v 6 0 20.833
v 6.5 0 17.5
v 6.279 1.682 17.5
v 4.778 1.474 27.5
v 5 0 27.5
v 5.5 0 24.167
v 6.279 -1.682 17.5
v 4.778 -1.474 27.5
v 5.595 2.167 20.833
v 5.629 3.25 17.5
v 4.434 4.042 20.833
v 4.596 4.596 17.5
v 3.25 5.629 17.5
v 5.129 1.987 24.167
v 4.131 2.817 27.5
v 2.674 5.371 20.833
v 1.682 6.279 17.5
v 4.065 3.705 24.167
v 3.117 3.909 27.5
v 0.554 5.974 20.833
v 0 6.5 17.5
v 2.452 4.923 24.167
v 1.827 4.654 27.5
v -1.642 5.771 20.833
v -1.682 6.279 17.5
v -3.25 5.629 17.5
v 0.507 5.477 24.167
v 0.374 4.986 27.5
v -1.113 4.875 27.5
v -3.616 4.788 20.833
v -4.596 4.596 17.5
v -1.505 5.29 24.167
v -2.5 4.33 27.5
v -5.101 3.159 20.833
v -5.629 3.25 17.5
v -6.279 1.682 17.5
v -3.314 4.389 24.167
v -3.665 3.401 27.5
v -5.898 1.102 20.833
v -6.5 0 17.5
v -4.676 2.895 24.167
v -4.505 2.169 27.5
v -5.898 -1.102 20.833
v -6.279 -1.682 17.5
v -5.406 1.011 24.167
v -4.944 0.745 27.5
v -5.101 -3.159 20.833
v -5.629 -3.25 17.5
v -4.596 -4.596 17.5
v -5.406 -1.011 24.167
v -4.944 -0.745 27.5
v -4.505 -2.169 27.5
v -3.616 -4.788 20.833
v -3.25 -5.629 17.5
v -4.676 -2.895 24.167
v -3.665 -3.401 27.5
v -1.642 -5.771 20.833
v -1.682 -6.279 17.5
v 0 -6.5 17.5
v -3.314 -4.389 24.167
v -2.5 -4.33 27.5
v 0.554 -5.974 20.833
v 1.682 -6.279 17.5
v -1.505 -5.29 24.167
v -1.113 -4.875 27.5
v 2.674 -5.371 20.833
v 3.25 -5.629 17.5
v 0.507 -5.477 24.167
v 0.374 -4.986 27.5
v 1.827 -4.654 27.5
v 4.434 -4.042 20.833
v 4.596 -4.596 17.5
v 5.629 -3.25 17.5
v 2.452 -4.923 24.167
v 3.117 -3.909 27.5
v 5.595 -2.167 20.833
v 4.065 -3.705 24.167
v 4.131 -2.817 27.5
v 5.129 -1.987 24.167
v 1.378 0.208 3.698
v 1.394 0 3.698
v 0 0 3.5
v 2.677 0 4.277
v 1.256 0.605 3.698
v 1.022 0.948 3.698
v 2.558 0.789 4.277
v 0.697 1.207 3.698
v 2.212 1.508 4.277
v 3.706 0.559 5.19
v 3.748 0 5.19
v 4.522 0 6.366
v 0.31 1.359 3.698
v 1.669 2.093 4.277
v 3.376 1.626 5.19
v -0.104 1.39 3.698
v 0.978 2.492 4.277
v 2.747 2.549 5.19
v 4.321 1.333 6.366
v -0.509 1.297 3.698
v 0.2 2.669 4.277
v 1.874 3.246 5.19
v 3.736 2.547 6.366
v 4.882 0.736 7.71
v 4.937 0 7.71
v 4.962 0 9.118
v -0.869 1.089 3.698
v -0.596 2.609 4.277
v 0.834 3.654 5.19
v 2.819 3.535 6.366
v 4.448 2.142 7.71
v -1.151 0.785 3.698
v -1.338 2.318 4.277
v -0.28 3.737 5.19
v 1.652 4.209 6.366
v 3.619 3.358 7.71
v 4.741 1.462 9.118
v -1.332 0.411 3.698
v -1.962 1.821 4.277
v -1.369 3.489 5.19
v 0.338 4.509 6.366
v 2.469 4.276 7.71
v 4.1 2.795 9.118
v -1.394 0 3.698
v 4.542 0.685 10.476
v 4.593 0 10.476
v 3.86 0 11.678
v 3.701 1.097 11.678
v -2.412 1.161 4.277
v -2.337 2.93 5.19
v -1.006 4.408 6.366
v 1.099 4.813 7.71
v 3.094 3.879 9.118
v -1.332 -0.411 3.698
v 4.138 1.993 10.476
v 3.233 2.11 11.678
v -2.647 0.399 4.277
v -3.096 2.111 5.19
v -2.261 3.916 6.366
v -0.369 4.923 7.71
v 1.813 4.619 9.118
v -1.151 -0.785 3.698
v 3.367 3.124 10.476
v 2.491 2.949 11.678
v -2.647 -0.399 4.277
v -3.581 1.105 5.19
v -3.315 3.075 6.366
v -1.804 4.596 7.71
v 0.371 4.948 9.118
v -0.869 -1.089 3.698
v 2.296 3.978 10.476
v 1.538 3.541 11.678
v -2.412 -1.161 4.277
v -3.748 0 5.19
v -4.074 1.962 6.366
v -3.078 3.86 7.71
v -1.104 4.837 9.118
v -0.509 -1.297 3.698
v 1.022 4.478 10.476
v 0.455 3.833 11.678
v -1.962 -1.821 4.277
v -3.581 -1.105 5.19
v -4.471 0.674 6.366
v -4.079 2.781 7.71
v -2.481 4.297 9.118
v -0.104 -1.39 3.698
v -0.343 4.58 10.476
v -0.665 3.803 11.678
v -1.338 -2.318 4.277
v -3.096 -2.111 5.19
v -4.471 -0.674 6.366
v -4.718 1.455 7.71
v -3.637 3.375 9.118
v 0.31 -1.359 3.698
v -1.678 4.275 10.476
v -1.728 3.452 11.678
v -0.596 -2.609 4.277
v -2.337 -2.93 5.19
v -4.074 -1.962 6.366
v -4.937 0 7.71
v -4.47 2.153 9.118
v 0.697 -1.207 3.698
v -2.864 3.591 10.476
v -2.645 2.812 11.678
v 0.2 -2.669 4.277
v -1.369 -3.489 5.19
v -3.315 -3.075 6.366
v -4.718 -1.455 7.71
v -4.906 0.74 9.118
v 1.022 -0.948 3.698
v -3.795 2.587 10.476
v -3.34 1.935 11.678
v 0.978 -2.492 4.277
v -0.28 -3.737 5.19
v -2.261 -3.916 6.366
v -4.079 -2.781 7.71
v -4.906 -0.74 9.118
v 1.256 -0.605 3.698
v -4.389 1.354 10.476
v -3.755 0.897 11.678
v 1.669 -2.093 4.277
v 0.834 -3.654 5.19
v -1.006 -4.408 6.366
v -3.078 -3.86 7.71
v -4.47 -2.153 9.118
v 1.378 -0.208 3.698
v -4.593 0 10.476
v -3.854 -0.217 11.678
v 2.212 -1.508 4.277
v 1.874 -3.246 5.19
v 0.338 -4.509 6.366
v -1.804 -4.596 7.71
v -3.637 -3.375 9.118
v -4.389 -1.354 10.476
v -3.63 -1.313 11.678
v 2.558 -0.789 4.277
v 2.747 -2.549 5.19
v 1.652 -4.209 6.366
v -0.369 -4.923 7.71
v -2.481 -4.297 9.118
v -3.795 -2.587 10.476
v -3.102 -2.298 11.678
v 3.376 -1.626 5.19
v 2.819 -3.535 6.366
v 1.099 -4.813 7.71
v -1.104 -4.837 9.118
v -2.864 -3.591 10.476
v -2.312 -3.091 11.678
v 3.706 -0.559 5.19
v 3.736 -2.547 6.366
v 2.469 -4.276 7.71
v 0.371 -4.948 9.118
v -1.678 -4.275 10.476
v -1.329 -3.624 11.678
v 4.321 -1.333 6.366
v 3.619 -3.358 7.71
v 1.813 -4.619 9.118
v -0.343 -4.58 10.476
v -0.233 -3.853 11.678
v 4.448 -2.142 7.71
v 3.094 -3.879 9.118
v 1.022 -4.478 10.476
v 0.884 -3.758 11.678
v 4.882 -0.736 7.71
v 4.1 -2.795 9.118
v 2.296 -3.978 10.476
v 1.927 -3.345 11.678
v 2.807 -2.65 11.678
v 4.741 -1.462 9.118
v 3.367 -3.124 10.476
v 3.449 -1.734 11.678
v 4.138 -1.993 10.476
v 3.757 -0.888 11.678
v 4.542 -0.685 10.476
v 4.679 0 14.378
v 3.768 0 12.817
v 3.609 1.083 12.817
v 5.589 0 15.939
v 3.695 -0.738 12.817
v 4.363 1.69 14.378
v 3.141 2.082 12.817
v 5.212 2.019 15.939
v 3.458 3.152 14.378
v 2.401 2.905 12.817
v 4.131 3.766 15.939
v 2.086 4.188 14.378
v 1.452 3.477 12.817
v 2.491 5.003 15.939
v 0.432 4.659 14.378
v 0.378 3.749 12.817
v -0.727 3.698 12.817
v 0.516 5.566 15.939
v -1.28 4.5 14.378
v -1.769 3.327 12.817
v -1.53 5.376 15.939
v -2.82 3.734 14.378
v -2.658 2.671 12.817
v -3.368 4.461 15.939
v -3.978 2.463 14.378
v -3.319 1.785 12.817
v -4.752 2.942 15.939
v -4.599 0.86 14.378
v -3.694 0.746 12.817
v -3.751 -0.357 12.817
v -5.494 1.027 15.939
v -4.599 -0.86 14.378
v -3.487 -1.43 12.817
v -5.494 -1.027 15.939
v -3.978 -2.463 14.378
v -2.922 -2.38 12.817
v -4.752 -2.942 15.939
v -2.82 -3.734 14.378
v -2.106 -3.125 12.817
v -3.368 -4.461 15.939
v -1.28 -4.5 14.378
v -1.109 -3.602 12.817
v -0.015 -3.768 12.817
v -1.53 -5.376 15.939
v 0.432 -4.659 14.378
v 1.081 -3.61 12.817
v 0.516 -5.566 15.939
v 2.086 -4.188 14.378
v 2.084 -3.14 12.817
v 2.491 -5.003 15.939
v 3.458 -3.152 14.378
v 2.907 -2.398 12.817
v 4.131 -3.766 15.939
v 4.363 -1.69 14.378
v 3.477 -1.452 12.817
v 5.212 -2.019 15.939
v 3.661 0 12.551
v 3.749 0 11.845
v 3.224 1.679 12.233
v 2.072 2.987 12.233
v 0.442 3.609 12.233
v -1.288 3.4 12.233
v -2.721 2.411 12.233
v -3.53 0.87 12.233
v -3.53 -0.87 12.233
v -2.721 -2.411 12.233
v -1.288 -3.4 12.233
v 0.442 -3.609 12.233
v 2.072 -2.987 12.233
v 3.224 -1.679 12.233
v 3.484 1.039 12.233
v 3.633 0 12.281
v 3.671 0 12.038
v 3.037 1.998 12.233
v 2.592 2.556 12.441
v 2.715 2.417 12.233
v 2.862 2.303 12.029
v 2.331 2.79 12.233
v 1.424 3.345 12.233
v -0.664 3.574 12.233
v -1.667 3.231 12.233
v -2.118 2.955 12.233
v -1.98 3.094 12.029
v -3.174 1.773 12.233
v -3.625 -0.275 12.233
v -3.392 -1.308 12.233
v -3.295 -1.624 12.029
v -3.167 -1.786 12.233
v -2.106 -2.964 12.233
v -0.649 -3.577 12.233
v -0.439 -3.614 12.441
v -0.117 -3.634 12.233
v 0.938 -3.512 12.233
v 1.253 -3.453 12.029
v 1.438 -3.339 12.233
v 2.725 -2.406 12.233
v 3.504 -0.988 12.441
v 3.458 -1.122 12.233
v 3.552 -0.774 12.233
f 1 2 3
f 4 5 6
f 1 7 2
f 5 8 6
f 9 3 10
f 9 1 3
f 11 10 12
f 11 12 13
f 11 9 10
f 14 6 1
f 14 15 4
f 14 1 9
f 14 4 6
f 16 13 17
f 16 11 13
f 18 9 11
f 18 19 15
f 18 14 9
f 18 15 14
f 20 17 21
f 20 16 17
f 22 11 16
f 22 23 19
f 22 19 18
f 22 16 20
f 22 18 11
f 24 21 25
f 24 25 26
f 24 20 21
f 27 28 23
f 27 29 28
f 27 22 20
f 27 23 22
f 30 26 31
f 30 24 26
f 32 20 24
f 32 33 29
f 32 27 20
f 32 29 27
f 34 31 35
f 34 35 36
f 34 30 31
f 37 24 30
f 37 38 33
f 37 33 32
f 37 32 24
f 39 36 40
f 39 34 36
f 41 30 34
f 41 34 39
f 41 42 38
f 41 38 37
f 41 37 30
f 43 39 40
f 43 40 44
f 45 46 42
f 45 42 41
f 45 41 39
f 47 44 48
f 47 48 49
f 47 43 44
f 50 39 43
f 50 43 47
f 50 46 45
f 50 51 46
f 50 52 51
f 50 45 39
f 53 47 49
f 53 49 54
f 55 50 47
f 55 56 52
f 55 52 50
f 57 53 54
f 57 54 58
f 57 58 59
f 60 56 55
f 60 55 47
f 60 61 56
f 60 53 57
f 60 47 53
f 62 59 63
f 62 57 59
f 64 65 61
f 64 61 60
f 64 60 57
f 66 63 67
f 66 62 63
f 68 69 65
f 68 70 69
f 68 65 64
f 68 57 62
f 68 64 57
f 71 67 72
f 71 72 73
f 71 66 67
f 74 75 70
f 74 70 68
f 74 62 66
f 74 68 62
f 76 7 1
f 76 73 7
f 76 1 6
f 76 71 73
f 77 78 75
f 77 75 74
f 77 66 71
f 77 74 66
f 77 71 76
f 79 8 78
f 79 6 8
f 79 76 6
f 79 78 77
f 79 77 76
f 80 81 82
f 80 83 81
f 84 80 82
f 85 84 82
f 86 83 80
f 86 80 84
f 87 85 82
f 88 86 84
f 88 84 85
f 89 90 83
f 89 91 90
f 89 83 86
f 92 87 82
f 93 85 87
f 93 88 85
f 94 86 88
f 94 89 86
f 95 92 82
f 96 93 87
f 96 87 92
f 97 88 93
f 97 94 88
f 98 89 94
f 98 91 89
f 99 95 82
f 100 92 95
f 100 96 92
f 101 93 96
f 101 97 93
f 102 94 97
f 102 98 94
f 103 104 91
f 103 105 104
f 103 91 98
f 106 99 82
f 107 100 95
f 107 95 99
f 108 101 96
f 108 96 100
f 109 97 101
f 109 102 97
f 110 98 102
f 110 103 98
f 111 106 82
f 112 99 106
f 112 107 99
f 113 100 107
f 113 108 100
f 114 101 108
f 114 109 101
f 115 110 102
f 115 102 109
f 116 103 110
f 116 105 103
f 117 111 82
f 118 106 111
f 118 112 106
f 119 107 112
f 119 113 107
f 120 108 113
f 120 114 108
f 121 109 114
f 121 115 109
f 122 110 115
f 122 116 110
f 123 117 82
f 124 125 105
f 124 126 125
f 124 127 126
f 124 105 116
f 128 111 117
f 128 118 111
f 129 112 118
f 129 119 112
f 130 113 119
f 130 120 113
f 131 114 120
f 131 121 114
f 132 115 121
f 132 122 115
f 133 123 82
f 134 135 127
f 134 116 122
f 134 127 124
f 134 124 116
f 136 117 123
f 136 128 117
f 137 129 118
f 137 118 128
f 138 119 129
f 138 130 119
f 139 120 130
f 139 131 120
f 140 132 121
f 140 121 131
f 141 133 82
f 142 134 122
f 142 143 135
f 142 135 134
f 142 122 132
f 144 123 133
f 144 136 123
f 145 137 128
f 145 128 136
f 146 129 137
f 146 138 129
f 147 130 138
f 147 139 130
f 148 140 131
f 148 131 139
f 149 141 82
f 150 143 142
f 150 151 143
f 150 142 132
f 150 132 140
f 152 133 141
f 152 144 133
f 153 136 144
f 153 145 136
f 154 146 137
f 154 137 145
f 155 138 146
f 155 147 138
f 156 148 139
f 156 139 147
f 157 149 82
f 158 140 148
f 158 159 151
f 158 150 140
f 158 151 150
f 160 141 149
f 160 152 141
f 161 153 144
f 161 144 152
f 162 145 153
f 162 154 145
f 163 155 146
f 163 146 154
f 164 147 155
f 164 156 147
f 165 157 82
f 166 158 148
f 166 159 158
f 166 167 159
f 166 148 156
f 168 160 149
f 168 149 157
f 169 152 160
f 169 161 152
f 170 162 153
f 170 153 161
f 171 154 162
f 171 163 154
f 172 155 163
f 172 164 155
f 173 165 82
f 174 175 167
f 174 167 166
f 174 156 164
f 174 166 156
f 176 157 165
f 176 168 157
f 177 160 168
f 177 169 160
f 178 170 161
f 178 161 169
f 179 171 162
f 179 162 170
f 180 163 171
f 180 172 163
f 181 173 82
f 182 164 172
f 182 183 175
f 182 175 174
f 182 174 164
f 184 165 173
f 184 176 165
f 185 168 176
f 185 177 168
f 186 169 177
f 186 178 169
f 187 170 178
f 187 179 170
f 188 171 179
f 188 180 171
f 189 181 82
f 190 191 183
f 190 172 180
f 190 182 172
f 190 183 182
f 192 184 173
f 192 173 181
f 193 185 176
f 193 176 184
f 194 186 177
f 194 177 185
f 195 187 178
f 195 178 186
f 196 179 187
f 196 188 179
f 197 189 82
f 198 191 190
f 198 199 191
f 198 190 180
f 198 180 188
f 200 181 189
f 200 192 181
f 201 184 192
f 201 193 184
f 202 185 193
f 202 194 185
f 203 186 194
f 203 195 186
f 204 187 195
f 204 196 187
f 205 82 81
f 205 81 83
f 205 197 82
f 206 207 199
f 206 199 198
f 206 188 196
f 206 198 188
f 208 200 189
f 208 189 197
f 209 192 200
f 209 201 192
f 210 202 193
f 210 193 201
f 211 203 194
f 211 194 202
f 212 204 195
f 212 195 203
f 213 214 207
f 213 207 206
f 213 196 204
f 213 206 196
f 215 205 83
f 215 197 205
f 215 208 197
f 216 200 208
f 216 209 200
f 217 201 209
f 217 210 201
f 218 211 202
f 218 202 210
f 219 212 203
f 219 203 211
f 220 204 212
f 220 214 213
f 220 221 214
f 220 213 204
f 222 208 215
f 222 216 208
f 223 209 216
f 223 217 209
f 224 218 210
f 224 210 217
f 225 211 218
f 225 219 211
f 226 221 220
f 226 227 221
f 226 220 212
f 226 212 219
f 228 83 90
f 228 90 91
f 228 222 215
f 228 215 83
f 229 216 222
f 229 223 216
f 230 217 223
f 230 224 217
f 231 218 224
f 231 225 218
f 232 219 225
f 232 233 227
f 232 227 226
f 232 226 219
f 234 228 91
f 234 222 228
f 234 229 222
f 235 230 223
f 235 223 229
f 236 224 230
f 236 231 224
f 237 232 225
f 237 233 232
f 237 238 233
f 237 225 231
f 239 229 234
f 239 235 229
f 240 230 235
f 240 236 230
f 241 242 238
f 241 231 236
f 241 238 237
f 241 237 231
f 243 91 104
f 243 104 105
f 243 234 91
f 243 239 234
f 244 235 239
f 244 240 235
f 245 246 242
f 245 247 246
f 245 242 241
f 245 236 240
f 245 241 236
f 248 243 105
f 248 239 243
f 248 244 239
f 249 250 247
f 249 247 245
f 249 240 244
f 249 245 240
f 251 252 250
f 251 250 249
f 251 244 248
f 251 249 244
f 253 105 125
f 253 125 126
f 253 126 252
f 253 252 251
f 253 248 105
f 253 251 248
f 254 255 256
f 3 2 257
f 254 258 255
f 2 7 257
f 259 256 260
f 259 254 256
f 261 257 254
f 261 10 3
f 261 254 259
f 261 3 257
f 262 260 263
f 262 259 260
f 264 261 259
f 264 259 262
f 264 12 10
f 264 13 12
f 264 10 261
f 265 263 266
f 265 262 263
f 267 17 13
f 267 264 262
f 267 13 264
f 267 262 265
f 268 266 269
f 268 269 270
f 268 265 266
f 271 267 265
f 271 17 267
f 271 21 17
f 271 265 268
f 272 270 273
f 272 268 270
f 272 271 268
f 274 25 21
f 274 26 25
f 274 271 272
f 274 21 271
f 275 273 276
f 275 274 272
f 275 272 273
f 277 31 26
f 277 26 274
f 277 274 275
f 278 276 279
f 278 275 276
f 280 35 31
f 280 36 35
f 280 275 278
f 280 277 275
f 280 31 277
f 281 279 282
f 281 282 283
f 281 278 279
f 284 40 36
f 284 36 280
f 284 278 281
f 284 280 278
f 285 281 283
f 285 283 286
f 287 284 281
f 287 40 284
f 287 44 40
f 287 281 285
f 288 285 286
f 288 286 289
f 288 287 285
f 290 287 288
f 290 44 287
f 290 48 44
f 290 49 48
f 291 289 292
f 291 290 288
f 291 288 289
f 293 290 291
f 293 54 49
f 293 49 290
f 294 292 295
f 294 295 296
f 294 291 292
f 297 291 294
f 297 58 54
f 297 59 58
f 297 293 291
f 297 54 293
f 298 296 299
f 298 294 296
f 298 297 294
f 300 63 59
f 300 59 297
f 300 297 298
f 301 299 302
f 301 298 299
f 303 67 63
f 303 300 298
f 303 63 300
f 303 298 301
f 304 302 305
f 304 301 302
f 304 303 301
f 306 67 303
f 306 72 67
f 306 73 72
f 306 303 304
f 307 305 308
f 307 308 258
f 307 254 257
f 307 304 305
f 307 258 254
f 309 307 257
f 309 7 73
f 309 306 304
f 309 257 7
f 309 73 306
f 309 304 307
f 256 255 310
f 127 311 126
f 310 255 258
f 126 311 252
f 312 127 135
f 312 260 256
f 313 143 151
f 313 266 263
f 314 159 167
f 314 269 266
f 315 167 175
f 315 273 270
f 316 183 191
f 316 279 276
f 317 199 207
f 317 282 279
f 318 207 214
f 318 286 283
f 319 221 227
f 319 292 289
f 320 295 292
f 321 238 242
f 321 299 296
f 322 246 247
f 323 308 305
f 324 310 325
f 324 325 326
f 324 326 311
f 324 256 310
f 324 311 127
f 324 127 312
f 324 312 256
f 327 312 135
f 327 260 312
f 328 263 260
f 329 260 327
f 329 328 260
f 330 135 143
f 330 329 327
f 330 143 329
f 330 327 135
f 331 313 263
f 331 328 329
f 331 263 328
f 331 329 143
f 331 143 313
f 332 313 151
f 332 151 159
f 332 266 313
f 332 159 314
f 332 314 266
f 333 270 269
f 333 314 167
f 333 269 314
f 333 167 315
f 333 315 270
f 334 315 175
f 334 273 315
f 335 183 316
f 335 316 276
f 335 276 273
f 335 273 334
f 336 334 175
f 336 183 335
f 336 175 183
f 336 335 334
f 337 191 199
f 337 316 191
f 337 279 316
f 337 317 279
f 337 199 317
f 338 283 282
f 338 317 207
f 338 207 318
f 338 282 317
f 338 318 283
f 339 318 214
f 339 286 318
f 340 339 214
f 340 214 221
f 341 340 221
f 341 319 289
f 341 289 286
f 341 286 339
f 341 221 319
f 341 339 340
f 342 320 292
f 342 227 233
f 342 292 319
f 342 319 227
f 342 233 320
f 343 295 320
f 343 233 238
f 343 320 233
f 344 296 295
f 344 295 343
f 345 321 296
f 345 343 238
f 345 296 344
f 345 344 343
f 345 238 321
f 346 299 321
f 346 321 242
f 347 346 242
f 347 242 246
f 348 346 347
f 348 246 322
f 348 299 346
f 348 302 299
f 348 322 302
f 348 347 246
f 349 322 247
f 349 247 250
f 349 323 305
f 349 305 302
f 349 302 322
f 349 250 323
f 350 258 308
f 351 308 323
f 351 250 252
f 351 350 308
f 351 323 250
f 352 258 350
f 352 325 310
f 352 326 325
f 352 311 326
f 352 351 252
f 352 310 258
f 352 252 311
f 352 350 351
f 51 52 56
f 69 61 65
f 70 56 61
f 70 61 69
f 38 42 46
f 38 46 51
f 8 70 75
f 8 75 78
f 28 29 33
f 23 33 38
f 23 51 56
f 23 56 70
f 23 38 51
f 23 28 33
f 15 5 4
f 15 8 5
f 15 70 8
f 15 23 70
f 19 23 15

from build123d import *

# Parameters (mm, degrees)
FILLET005_R = 1


with BuildPart() as cone001:
    # Cone001 → Cone001 (revolve)
    with BuildSketch(Plane(origin=(0, 0, 17), x_dir=(1, 0, 0), z_dir=(0, -1, 0))):
        Polygon((0, 0), (6.5, 0), (5, 10), (0, 10), align=None)
    revolve(axis=Axis((0, 0, 17), (0, 0, 1)))


with BuildPart() as cone:
    # Cone → Cone (revolve)
    with BuildSketch(Plane(origin=(0, 0, 11), x_dir=(1, 0, 0), z_dir=(0, -1, 0))):
        Polygon((0, 0), (3, 0), (6.5, 6), (0, 6), align=None)
    revolve(axis=Axis((0, 0, 11), (0, 0, 1)))


with BuildPart() as shaft_in_place:
    # Sphere → Sphere (revolve)
    with BuildSketch(Plane(origin=(0, 0, 8), x_dir=(1, 0, 0), z_dir=(0, -1, 0))):
        with BuildLine():
            ThreePointArc((0, -5), (5, 0), (0, 5))
            Line((0, 5), (0, -5))
        make_face()
    revolve(axis=Axis((0, 0, 8), (0, 0, 1)))

    # Fusion: union Cone001, Cone
    add(cone001.part)
    add(cone.part)


with BuildPart() as shaft_in_place_1:
    # Fusion placement: moved
    add(shaft_in_place.part.moved(Location((0, 0, 0.5))))

    # Fillet005
    fillet005_edges = [shaft_in_place_1.edges().sort_by_distance(p)[0] for p in [
        (-3.392555, 0, 12.172951),
    ]]
    fillet(fillet005_edges, radius=FILLET005_R)


solid = shaft_in_place_1.part
